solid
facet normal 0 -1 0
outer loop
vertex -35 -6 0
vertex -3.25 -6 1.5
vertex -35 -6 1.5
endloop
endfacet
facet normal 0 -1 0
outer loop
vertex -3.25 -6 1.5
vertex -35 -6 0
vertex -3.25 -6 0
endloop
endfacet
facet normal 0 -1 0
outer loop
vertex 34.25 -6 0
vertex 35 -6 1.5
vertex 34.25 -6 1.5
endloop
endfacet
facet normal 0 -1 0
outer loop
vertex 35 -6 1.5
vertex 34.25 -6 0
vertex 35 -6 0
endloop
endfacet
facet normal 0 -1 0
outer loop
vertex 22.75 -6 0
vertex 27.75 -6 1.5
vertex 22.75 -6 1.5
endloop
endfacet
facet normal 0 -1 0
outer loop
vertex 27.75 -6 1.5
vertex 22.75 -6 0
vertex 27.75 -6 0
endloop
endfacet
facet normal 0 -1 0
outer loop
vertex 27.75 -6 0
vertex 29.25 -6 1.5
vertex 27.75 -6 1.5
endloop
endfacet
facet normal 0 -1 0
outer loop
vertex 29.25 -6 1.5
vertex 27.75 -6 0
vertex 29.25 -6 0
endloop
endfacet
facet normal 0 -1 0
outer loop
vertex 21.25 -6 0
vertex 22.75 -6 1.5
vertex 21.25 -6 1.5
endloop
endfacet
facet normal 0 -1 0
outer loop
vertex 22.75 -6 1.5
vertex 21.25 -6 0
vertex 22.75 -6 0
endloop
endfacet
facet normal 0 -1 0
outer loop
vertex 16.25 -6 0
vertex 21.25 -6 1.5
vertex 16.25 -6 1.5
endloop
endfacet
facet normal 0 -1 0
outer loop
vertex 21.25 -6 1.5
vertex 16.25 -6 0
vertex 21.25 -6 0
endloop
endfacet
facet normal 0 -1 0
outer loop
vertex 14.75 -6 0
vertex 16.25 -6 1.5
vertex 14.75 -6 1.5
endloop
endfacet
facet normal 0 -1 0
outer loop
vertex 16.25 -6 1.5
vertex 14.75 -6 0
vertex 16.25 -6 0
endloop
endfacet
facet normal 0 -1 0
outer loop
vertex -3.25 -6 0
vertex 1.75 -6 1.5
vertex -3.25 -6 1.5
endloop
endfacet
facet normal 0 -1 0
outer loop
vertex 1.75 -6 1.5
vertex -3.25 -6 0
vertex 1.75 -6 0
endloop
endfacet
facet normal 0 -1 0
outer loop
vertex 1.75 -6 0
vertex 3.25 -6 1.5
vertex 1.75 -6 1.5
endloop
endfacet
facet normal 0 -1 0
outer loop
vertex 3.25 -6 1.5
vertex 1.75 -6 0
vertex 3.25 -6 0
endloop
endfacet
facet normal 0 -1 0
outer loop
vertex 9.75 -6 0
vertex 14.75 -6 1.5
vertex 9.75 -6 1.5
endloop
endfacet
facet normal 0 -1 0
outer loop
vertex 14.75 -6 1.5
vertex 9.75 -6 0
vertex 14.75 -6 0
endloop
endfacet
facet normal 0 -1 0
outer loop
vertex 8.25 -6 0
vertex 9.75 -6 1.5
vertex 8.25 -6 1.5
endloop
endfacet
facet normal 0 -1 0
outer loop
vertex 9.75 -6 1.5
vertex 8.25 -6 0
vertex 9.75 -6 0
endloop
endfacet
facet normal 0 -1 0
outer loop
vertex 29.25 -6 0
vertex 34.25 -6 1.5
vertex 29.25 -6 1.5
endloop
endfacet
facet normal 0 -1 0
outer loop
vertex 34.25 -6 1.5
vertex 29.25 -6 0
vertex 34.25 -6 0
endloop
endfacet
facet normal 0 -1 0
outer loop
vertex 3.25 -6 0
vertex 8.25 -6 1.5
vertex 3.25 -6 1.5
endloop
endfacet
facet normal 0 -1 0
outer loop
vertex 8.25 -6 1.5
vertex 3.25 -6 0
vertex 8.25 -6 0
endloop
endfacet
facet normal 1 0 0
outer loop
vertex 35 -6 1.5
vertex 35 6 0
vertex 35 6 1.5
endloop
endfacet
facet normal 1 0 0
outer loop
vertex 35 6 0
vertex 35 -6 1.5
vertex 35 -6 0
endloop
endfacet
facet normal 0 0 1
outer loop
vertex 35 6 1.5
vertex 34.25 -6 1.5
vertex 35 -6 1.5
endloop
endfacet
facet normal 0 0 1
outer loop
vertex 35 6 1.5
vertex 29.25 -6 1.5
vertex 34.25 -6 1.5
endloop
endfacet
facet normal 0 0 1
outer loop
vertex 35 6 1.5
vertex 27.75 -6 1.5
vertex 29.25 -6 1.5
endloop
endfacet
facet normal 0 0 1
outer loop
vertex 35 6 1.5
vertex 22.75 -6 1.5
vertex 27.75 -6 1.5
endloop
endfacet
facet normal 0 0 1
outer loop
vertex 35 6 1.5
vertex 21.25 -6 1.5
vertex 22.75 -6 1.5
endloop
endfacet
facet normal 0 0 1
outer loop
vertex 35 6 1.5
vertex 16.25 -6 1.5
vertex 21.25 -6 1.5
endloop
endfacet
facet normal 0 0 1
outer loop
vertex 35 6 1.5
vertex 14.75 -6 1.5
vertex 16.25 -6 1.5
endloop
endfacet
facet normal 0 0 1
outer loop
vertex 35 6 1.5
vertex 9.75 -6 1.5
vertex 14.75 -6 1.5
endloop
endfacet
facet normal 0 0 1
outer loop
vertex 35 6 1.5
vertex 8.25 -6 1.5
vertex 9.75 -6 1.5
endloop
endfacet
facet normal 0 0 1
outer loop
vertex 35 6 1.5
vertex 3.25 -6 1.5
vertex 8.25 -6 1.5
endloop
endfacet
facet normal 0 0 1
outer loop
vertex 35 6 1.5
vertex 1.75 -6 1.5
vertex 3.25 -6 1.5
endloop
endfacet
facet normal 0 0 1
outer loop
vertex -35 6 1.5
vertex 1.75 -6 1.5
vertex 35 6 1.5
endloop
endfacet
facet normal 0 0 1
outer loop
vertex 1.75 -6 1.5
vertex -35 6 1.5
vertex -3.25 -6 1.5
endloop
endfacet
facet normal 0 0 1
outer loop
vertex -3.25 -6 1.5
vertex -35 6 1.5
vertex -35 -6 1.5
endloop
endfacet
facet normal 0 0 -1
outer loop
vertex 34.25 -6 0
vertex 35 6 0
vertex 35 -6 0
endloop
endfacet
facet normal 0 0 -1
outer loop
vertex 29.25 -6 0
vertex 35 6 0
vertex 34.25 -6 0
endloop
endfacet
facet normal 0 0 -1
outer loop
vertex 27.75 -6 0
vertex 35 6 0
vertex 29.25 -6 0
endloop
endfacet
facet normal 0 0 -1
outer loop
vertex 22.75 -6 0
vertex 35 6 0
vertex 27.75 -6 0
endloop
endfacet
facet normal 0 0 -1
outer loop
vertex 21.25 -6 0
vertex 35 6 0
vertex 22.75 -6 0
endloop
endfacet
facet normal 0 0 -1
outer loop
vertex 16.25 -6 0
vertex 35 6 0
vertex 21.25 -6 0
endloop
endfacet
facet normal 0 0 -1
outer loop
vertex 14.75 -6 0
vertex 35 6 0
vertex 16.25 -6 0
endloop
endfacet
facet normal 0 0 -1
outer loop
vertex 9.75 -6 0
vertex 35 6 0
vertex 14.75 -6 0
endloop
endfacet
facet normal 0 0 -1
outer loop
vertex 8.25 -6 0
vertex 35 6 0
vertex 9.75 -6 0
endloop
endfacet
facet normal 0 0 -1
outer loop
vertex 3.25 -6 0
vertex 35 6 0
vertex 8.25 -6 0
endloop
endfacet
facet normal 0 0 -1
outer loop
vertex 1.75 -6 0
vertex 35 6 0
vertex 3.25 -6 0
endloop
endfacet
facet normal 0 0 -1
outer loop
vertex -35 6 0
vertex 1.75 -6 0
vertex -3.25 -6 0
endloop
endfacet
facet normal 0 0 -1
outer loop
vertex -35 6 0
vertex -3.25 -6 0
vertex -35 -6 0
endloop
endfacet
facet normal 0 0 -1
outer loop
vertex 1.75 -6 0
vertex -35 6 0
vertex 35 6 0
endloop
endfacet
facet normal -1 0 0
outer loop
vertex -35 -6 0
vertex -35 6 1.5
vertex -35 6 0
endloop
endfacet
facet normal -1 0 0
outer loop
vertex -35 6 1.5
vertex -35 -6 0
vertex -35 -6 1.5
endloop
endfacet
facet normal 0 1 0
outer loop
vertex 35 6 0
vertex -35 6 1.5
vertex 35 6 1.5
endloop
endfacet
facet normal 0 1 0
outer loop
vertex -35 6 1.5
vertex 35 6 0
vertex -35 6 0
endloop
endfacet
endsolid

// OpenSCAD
// 10-well agarose gel comb, printed flat
// Units: mm

// ---- Spine ----
spine_len   = 70;    // spine length (X)
spine_wid   = 12;    // spine width (Y)

// ---- Teeth ----
teeth_n     = 10;    // number of teeth
teeth_w     = 5.0;   // tooth width (X)
teeth_l     = 12;    // tooth length (Y)
teeth_gap   = 1.5;   // gap between teeth (X)

// ---- Plate ----
plate_t     = 1.5;   // plate thickness (Z)

// ---- Misc ----
eps         = 0.5;   // cutter overshoot past faces

$fn = 64;

// Total length of the tooth row
row_len = (teeth_n - 1) * teeth_gap + teeth_n * teeth_w;

// X position of the row's left edge so the row is centred on the spine
row_x0 = -spine_len / 2 + row_len / 2;

difference() {
    // Base plate
    translate([-spine_len / 2, -spine_wid / 2, 0])
        cube([spine_len, spine_wid, plate_t]);

    // Teeth, hanging from the -Y edge of the spine
    for (i = [0 : teeth_n - 1])
        translate([row_x0 + i * (teeth_w + teeth_gap), -spine_wid / 2 - teeth_l, 0])
            cube([teeth_w, teeth_l, plate_t + eps]);
}
